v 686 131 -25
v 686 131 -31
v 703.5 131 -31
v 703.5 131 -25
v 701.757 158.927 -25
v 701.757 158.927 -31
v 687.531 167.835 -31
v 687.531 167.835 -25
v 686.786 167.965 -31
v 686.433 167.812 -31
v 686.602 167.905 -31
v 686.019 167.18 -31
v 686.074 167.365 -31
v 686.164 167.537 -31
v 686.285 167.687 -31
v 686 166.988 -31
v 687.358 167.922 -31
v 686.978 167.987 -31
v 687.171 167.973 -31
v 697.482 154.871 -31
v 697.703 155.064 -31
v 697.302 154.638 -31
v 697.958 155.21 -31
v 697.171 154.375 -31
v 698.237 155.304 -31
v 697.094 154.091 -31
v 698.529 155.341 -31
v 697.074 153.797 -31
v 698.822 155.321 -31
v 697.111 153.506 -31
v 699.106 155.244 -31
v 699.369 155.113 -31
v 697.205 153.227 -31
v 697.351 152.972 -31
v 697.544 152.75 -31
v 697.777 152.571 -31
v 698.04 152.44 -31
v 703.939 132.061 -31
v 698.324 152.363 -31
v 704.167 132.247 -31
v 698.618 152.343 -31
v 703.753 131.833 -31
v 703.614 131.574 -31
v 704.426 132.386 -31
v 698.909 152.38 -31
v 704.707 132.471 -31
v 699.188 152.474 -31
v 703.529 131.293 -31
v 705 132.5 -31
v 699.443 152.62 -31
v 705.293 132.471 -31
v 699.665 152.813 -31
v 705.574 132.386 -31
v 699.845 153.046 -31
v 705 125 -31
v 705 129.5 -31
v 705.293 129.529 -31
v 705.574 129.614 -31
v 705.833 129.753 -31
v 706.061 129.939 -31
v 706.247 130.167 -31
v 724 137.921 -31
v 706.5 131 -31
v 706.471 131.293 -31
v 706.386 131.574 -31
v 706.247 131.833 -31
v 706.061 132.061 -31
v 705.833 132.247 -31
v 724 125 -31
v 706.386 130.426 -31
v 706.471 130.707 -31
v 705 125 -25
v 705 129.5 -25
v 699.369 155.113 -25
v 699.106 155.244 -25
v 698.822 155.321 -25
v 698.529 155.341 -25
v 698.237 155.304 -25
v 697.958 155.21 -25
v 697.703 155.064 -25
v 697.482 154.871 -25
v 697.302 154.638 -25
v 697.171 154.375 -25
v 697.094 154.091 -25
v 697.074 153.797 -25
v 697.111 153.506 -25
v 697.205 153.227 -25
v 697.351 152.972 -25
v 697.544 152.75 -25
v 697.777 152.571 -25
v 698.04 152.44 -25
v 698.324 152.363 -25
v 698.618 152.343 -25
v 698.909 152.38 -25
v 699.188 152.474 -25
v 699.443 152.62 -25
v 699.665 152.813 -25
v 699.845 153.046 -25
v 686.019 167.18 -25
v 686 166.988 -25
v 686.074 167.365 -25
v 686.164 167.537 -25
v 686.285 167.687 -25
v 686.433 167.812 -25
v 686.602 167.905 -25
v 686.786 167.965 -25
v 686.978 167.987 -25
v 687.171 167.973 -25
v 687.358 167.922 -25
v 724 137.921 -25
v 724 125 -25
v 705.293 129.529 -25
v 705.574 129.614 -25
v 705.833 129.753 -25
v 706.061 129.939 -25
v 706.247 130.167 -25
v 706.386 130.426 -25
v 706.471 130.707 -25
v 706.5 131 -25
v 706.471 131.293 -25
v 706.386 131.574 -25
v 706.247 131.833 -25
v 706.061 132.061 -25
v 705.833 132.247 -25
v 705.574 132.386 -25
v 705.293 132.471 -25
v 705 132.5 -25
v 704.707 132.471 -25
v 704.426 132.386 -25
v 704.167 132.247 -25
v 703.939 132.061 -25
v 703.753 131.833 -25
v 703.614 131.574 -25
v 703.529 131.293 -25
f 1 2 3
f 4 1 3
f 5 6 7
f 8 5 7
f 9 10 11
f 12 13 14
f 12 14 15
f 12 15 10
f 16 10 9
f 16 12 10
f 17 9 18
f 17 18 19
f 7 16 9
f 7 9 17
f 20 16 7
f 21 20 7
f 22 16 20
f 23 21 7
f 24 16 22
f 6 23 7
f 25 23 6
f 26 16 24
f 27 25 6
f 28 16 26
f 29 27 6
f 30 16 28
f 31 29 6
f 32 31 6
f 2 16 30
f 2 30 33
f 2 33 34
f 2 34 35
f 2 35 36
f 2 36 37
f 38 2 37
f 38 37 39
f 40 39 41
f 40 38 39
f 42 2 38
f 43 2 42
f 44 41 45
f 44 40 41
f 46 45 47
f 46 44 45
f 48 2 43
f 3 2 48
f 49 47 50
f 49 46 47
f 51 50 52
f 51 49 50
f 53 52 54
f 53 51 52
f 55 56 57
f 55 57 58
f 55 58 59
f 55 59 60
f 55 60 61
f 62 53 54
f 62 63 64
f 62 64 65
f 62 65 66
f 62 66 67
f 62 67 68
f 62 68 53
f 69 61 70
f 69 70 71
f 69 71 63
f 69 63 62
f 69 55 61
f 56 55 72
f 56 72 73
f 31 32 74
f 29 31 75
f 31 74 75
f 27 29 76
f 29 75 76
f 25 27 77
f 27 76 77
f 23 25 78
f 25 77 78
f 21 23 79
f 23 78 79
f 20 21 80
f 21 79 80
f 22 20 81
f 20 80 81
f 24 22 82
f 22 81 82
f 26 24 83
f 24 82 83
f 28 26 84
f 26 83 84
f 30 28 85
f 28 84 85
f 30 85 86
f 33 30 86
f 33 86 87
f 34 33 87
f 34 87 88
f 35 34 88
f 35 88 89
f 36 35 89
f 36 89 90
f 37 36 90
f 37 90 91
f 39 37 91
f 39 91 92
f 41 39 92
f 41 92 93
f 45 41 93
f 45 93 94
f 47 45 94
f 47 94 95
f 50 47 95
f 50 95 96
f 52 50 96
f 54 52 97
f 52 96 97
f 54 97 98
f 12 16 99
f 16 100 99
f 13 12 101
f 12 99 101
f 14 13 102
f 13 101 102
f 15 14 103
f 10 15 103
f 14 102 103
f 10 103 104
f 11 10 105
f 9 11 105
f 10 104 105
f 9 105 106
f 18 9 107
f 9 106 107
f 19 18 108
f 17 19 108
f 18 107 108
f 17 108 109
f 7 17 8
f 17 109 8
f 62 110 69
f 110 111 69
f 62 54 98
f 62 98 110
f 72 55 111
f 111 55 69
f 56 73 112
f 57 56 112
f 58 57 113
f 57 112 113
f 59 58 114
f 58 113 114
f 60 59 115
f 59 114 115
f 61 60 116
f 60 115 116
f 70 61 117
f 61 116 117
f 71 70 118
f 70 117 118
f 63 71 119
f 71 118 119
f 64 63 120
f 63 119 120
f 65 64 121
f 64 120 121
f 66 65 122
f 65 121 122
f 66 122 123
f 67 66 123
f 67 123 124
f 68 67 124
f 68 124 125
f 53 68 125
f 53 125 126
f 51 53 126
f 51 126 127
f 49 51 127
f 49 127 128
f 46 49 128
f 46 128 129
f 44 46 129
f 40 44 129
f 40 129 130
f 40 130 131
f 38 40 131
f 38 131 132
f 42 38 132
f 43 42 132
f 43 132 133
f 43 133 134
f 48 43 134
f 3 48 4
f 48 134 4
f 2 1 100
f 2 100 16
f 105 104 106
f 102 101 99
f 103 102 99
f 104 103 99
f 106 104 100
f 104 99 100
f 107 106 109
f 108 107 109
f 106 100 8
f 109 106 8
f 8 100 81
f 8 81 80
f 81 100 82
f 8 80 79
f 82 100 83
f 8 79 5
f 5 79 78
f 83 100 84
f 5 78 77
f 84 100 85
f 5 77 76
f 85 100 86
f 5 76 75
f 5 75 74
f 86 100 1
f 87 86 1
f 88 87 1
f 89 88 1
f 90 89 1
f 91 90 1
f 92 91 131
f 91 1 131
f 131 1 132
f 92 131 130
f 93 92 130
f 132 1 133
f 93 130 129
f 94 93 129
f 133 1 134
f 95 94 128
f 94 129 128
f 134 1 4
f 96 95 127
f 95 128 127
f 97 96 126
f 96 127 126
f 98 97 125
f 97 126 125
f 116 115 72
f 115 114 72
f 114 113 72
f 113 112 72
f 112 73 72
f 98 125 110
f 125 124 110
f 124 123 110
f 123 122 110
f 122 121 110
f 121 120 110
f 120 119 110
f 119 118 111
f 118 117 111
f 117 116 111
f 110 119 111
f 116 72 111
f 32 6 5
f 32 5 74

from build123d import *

# Parameters (mm, degrees)
BOSS_EXTRUDE1_START     = -31
SKETCH1_W               = 19
SKETCH1_H               = 6
BOSS_EXTRUDE1_DEPTH     = 6
BOSS_EXTRUDE2_REACH     = 726.688
SKETCH2_W               = 38
SKETCH2_H               = 6
SKETCH3_R               = 1.5
CUT_EXTRUDE1_DEPTH      = 744.440196757
FILLET1_R               = 1
CUT_EXTRUDE3_DEPTH      = 744.257611618
CUT_EXTRUDE3_DEPTH_BACK = 744.257611618
SKETCH5_R               = 1.5
CUT_EXTRUDE4_DEPTH      = 744.257611618


with BuildPart() as part:
    # Sketch1 → Boss-Extrude1 (new body)
    with BuildSketch(Plane.XY.offset(BOSS_EXTRUDE1_START)):
        with Locations((714.5, 128)):
            Rectangle(SKETCH1_W, SKETCH1_H)
    extrude(amount=BOSS_EXTRUDE1_DEPTH)

    # Boss-Extrude2: up to this plane
    boss_extrude2_end = Plane(origin=(203.909377292, 470.655270204, 323.5), z_dir=(-0.5307002791731883, -0.8475595635030614, 0))
    # Sketch2 → Boss-Extrude2 (add, up to the surface)
    with BuildSketch(Plane(origin=(0, 131, 0), x_dir=(1, 0, 0), z_dir=(0, 1, 0)), mode=Mode.PRIVATE) as boss_extrude2_sk1:
        with Locations((705, 28)):
            Rectangle(SKETCH2_W, SKETCH2_H)
    boss_extrude2_tool1 = split(extrude(boss_extrude2_sk1.sketch, amount=BOSS_EXTRUDE2_REACH, mode=Mode.PRIVATE), bisect_by=boss_extrude2_end, keep=Keep.BOTH, mode=Mode.PRIVATE)
    add(boss_extrude2_tool1.solids().sort_by_distance((705, 131, -28))[0])

    # Sketch3 → Cut-Extrude1 (cut, through all)
    with BuildSketch(Plane.XY.offset(-25)):
        with Locations((705, 131)):
            Circle(SKETCH3_R)
    extrude(amount=-CUT_EXTRUDE1_DEPTH, mode=Mode.SUBTRACT)

    # Fillet1
    fillet1_edges = [part.edges().sort_by_distance(p)[0] for p in [
        (686, 168.79373849, -28),
    ]]
    fillet(fillet1_edges, radius=FILLET1_R)

    # Sketch4 → Cut-Extrude3 (cut, two sides: drawn at the far end of the back side and taken through both)
    with BuildSketch(Plane.XY.offset(-25).offset(-CUT_EXTRUDE3_DEPTH_BACK)):
        Polygon((701.75741477, 158.927217271), (698.573213095, 153.84185989), (724, 137.920851515), (727.184201675, 143.006208896), align=None)
    extrude(amount=CUT_EXTRUDE3_DEPTH + CUT_EXTRUDE3_DEPTH_BACK, mode=Mode.SUBTRACT)

    # Sketch5 → Cut-Extrude4 (cut, through all)
    with BuildSketch(Plane.XY.offset(-25)):
        with Locations((698.573213095, 153.84185989)):
            Circle(SKETCH5_R)
    extrude(amount=-CUT_EXTRUDE4_DEPTH, mode=Mode.SUBTRACT)


solid = part.part
